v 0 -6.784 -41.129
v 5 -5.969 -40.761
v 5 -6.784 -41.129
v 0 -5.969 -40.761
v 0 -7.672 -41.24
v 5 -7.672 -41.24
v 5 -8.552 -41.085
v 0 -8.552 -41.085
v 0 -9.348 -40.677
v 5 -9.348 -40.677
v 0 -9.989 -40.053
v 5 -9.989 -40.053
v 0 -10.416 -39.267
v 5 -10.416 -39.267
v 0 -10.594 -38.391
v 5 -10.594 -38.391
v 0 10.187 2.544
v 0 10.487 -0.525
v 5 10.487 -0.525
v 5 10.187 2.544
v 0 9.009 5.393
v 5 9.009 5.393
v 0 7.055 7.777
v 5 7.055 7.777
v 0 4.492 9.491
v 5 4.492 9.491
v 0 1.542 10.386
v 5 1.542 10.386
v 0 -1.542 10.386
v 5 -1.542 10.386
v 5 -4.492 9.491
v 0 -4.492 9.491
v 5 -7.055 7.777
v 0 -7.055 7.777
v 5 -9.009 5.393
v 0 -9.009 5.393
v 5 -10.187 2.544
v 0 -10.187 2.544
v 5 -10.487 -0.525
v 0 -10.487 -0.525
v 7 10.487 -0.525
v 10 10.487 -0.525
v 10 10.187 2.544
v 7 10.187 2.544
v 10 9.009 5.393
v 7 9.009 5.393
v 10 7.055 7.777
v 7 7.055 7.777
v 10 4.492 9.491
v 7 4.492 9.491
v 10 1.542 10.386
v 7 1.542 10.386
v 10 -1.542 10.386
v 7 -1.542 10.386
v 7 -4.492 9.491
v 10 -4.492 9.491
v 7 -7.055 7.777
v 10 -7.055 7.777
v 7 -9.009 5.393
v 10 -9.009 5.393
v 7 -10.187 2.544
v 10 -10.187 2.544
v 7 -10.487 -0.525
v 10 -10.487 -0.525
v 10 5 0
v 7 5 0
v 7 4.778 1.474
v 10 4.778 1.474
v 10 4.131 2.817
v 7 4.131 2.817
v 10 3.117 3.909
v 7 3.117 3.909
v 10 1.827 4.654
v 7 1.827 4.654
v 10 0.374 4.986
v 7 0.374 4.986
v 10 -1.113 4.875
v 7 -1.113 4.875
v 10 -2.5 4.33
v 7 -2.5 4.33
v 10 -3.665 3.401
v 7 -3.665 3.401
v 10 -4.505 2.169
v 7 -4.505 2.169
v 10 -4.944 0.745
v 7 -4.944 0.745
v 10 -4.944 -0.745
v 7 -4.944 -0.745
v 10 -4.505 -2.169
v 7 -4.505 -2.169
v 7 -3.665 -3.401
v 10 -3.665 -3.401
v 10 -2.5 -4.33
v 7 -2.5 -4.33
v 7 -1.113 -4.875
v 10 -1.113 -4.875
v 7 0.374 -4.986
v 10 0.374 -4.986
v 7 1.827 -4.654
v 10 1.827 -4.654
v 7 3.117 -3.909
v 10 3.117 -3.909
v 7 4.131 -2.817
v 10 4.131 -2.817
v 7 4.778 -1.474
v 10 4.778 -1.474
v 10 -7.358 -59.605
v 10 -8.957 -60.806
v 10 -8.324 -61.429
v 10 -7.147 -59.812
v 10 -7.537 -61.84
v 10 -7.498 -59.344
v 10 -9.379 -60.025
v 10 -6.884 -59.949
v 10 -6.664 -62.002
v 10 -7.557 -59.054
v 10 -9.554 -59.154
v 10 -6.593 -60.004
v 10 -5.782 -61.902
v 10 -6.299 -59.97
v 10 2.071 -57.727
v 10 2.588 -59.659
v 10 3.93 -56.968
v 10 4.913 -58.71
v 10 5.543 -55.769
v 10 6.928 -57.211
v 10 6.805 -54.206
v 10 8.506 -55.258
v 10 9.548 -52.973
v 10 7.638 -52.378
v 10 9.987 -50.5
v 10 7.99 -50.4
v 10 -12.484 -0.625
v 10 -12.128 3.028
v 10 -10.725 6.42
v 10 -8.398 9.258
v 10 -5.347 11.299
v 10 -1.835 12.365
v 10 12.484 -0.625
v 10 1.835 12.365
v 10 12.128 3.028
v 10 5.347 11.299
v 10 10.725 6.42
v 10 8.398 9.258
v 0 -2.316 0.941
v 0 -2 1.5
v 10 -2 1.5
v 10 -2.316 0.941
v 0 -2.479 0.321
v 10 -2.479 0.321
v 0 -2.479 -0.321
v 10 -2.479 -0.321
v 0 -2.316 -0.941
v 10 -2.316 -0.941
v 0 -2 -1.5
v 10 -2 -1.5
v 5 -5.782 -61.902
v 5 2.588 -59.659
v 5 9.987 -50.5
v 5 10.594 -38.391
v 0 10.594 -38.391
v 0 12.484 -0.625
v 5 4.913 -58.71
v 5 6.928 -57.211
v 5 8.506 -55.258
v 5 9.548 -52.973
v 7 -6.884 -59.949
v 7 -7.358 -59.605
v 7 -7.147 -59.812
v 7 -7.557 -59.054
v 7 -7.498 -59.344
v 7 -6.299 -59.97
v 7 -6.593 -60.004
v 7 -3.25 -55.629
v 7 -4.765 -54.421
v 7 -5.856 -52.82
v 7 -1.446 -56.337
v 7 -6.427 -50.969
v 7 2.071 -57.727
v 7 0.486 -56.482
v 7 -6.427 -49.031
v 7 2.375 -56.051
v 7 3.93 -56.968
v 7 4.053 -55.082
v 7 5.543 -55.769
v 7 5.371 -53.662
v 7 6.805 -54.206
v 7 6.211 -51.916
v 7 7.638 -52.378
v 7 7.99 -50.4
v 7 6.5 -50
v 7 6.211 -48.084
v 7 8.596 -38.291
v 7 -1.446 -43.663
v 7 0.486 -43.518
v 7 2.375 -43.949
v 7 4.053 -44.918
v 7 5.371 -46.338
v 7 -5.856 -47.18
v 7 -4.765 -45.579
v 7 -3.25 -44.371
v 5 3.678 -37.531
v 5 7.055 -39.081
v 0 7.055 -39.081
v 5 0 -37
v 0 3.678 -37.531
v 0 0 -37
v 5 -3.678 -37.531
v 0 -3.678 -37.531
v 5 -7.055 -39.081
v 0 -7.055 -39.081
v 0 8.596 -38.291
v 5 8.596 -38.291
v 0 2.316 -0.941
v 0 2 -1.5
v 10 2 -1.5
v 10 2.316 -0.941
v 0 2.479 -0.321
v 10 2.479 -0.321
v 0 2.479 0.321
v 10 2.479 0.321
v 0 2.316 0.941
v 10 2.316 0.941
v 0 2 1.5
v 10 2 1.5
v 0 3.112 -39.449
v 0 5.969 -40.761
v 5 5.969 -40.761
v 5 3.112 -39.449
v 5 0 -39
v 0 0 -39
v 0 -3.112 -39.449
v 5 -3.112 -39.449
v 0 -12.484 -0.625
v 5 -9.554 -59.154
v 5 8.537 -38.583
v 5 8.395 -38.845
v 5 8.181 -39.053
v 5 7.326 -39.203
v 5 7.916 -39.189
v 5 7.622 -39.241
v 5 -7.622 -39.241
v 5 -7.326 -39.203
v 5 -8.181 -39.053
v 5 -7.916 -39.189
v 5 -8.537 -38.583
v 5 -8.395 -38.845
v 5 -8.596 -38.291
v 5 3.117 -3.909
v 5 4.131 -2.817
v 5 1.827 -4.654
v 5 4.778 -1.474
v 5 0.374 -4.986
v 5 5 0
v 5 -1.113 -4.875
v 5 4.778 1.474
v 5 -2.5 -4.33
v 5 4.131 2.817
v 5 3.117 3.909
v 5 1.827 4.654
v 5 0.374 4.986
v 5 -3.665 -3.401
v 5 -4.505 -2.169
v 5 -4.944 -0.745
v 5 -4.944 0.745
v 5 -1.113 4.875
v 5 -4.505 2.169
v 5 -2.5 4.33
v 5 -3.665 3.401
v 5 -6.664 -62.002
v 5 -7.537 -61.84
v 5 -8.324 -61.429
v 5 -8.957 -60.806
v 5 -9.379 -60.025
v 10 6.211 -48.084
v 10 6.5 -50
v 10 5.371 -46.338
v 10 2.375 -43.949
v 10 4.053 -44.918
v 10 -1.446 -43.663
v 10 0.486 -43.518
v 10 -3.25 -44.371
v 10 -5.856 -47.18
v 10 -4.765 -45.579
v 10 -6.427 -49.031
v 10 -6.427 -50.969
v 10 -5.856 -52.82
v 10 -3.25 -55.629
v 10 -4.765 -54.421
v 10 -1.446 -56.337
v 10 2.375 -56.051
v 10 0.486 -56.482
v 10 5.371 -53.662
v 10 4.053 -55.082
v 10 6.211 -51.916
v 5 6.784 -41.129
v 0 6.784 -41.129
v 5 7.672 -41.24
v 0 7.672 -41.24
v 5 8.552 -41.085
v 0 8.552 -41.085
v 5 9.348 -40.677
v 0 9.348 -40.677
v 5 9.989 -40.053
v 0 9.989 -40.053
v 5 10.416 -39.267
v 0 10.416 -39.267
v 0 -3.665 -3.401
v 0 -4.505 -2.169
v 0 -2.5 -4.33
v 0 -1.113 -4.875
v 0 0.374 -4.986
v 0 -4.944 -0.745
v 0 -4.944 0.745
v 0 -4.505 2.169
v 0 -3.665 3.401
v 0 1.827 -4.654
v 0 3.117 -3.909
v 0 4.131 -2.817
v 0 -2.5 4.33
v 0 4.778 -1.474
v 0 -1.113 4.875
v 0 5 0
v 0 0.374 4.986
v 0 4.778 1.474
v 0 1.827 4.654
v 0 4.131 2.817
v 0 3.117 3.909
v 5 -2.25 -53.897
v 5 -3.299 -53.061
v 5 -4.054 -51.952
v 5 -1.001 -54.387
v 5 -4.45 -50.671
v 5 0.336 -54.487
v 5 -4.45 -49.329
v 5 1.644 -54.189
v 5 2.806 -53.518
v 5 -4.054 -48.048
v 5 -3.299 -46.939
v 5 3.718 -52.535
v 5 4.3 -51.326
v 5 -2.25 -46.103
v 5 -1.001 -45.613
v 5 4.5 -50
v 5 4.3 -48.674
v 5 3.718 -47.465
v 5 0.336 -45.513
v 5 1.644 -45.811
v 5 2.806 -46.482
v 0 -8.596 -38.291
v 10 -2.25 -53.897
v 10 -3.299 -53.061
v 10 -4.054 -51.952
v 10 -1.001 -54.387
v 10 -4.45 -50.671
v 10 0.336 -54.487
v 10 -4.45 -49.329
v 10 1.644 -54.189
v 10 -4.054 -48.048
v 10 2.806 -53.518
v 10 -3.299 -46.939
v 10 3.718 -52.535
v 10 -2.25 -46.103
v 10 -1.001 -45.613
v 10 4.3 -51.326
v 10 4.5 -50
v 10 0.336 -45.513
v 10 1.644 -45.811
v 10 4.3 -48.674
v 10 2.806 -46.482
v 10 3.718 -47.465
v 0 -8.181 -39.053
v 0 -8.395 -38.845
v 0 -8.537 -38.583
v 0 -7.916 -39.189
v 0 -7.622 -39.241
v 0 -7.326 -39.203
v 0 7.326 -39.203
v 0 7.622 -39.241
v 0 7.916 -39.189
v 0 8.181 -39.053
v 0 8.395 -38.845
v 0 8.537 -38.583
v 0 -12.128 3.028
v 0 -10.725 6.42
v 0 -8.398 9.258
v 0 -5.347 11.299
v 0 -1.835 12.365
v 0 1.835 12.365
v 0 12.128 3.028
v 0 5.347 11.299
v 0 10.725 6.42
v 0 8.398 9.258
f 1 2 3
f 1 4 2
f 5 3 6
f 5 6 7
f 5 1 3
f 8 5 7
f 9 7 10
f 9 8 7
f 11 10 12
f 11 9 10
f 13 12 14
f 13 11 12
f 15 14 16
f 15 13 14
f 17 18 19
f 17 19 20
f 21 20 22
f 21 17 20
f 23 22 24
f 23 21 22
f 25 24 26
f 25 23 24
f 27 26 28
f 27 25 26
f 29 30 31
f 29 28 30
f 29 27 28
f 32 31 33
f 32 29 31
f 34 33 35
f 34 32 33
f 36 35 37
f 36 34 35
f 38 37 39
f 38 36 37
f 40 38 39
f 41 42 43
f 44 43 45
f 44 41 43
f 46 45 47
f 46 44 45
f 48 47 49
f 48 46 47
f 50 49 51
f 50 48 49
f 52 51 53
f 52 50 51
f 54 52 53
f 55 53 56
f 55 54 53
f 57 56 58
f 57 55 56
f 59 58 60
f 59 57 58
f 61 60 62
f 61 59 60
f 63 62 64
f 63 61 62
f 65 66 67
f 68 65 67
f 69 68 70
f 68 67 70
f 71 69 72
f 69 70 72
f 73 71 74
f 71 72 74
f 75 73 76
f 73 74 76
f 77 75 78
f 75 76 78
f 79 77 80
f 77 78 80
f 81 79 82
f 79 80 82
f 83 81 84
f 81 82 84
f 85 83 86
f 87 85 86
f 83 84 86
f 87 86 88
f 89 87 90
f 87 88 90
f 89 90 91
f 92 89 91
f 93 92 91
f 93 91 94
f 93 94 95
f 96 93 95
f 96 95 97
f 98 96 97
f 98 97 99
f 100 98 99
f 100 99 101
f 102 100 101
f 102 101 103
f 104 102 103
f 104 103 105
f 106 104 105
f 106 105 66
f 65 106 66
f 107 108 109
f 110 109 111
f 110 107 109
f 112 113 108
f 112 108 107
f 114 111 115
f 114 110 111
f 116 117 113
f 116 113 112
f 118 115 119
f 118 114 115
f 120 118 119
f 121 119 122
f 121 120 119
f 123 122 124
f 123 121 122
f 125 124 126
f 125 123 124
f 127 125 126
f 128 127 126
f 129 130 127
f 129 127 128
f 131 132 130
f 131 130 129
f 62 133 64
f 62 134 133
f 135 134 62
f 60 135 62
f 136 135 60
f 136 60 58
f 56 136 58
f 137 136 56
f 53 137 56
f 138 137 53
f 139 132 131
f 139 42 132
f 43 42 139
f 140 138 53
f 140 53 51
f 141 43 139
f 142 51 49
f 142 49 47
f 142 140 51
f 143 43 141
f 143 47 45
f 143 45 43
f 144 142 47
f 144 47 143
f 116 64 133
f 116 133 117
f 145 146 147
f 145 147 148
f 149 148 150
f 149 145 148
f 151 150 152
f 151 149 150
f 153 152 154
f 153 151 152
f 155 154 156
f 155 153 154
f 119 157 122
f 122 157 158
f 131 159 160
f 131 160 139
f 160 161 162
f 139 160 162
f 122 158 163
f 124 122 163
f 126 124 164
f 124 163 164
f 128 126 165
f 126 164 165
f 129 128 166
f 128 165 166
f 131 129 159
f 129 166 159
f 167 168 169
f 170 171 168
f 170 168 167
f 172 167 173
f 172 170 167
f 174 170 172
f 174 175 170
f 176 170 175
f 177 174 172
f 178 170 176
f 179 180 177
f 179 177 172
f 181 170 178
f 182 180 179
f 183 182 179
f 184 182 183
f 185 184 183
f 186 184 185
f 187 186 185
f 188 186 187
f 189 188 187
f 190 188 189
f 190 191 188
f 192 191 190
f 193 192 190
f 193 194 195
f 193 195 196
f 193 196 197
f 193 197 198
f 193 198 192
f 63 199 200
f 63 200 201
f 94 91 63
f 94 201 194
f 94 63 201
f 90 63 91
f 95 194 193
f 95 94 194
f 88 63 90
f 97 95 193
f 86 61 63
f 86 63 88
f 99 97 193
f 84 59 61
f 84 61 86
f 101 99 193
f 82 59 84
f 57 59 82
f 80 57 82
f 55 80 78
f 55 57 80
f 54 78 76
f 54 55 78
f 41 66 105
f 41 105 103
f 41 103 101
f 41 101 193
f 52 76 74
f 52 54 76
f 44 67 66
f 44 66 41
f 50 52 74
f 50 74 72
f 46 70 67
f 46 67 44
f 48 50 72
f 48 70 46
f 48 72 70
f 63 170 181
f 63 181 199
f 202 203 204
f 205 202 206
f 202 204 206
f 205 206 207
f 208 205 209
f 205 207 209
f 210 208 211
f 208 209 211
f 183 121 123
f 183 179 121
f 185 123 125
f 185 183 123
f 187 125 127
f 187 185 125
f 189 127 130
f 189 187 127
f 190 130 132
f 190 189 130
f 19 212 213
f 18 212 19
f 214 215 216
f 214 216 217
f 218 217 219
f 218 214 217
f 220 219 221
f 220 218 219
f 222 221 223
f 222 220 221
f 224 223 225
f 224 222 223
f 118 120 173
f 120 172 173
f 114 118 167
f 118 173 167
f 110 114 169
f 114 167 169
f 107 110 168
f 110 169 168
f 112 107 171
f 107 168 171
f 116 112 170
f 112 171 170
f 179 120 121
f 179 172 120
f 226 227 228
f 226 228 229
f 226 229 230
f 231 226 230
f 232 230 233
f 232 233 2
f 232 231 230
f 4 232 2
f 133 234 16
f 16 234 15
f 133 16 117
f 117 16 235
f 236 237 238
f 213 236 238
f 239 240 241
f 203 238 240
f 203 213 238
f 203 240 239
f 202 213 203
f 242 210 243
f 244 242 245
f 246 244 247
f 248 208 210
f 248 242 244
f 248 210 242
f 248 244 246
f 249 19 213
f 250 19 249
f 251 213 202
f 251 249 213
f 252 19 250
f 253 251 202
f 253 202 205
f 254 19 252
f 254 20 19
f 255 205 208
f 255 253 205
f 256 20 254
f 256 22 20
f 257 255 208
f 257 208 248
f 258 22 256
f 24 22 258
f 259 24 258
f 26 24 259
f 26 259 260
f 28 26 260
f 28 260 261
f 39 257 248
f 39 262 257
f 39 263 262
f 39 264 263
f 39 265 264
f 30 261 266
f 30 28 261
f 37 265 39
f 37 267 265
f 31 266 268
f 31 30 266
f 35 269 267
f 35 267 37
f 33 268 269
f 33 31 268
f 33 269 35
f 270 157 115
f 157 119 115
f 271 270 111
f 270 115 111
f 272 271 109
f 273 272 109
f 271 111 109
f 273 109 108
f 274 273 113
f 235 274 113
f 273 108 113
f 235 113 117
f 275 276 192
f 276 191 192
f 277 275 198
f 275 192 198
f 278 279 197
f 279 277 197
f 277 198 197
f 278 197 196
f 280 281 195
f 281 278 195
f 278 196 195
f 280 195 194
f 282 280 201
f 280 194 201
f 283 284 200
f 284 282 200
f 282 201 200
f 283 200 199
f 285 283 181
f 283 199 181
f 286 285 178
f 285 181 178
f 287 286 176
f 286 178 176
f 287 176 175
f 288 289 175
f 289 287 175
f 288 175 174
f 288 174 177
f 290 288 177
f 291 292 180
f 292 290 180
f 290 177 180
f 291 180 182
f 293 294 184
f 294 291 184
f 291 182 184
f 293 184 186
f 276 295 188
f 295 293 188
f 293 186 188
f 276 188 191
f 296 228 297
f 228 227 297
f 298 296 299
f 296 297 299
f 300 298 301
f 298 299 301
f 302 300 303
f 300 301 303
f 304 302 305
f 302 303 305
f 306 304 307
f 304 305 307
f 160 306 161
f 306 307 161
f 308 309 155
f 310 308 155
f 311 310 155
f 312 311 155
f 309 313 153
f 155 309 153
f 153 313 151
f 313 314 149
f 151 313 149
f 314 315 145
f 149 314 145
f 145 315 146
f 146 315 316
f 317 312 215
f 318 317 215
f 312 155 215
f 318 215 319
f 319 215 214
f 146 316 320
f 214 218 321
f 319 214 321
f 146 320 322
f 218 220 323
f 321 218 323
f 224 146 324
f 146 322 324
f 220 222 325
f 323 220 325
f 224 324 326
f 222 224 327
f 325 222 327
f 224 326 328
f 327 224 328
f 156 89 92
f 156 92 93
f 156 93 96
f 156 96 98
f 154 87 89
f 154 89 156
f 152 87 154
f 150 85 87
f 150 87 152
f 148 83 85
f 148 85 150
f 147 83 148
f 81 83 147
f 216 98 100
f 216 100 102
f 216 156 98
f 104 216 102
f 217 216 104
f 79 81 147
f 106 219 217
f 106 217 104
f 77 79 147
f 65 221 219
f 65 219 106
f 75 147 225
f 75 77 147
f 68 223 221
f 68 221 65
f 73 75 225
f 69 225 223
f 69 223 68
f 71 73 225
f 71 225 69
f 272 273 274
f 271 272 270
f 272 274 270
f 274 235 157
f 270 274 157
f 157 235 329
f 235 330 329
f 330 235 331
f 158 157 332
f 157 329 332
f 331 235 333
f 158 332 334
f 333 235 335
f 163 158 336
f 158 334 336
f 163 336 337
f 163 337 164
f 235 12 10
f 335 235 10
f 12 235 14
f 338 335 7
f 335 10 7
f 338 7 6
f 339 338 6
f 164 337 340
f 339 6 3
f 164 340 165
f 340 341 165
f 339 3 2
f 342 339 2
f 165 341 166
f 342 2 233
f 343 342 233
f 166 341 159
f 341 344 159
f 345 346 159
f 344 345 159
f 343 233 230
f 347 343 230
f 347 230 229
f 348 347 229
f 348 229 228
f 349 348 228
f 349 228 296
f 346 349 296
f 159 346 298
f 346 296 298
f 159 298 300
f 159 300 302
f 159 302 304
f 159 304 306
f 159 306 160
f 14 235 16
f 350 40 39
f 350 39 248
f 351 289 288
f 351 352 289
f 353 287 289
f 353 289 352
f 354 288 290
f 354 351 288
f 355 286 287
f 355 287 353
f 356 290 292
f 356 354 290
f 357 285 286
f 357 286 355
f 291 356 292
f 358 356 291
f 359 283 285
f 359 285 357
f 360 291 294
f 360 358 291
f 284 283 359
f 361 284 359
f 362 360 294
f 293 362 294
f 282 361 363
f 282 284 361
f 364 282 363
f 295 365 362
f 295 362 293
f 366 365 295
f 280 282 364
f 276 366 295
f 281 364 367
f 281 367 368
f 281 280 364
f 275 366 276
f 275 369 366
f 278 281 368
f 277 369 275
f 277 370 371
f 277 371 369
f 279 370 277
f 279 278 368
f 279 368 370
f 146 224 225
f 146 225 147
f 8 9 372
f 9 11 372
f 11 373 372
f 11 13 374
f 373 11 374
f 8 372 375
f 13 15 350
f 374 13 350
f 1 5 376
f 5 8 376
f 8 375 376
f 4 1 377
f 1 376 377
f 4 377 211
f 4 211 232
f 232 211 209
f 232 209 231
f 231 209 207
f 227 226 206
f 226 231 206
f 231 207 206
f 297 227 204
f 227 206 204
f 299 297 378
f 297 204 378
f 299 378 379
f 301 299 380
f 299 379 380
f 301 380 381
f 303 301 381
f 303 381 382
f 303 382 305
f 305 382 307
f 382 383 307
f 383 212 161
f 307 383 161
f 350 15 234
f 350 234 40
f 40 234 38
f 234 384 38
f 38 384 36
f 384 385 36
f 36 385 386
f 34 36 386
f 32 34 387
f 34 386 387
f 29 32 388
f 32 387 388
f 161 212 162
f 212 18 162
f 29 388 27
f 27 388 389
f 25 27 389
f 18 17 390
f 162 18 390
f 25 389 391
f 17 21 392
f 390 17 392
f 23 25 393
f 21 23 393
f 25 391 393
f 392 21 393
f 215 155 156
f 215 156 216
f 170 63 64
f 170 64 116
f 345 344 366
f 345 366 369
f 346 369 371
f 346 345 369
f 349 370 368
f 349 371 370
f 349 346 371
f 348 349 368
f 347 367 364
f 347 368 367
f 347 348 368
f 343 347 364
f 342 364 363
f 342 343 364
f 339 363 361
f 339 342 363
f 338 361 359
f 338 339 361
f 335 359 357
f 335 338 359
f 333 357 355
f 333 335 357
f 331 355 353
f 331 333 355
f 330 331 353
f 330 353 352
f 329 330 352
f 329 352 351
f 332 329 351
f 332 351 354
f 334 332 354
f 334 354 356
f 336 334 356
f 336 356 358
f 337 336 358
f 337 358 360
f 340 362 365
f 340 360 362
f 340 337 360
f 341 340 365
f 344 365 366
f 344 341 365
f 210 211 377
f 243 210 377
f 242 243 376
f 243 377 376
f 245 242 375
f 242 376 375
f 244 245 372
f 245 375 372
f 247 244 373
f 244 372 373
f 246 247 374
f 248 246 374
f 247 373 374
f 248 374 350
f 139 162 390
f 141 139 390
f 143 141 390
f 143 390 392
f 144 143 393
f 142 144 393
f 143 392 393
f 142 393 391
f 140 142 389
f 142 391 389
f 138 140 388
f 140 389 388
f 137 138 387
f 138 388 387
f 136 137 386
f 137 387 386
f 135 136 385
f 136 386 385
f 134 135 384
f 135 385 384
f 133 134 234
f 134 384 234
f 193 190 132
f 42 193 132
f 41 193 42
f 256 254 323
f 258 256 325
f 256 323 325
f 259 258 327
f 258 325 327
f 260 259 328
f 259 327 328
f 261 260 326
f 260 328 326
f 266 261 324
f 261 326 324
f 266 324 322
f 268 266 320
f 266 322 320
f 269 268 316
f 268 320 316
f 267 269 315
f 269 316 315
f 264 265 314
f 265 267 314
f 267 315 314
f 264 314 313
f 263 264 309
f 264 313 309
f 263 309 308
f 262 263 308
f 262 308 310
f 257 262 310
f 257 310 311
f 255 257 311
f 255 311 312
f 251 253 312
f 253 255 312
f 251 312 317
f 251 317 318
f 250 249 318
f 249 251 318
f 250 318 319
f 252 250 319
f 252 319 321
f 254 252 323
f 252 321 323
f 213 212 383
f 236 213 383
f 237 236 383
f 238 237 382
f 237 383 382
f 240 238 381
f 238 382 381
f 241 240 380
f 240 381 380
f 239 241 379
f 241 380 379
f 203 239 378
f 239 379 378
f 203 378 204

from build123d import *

# Parameters (mm, degrees)
F1_DEPTH  = 10
F3_DEPTH  = 5
F4_R      = 4.5
F5_DEPTH  = 10.001
F6_T      = -2
F7_R      = 1
F8_R      = 3
F10_DEPTH = 2
F11_R     = 5
F12_DEPTH = 10
F14_DEPTH = 10.001


with BuildPart() as f1:
    # F0 (on Right) → F1 (new body)
    with BuildSketch(Plane.YZ):
        with BuildLine():
            Line((9.9874921777, -50.5), (12.4843652221, -0.625))
            ThreePointArc((12.4843652221, -0.625), (0, 12.5), (-12.4843652221, -0.625))
            Line((-12.4843652221, -0.625), (-9.3685649734, -62.863061223))
            Line((-9.3685649734, -62.863061223), (2.588190451, -59.6592582629))
            ThreePointArc((2.588190451, -59.6592582629), (7.7788142654, -56.2841108061), (9.9874921777, -50.5))
        make_face()
    extrude(amount=F1_DEPTH)

    # F2 (on Right) → F3 (cut)
    with BuildSketch(Plane.YZ):
        with BuildLine():
            ThreePointArc((11, -50), (0, -39), (-11, -50))
            Line((-11, -50), (-11, -80))
            Line((-11, -80), (11, -80))
            Line((11, -80), (11, -50))
        make_face()
    extrude(amount=F3_DEPTH, mode=Mode.SUBTRACT)

    # F4 (on Right) → F5 (cut, through all)
    with BuildSketch(Plane.YZ):
        with Locations((0, -50)):
            Circle(F4_R)
    extrude(amount=F5_DEPTH, mode=Mode.SUBTRACT)

    # F6
    f6_openings = [f1.faces().sort_by_distance(p)[0] for p in [
        (0, 0, -14.700163),
        (10, -0.155944, -22.13999),
    ]]
    offset(amount=F6_T, openings=f6_openings, kind=Kind.INTERSECTION)

    # F7
    f7_edges = [f1.edges().sort_by_distance(p)[0] for p in [
        (3.5, 8.502341, -40.165866),
        (3.5, -8.502341, -40.165866),
        (8.5, -7.494852, -60.290449),
    ]]
    fillet(f7_edges, radius=F7_R)

    # F8
    f8_edges = [f1.edges().sort_by_distance(p)[0] for p in [
        (2.5, 10.216621, -45.923156),
        (2.5, -10.216621, -45.923156),
        (7.5, -9.368565, -62.863061),
    ]]
    fillet(f8_edges, radius=F8_R)

    # F9 (on face) → F10 (join)
    with BuildSketch(Plane(origin=(5, 0, 0), x_dir=(0, -1, 0), z_dir=(-1, 0, 0))):
        with BuildLine():
            Line((-10.4868667866, -0.525), (-8.5962115248, -38.2908092756))
            ThreePointArc((-8.5962115248, -38.2908092756), (-8.0535356457, -39.1307514702), (-7.054786428, -39.0807514702))
            ThreePointArc((-7.054786428, -39.0807514702), (0, -37), (7.054786428, -39.0807514702))
            ThreePointArc((7.054786428, -39.0807514702), (8.0535356457, -39.1307514702), (8.5962115248, -38.2908092756))
            Line((8.5962115248, -38.2908092756), (10.4868667866, -0.525))
            ThreePointArc((10.4868667866, -0.525), (0, 10.5), (-10.4868667866, -0.525))
        make_face()
    extrude(amount=-F10_DEPTH)

    # F11 (on Right) → F12 (join)
    with BuildSketch(Plane.YZ):
        Circle(F11_R)
    extrude(amount=F12_DEPTH)

    # F13 (on Right) → F14 (cut, through all)
    with BuildSketch(Plane.YZ):
        with BuildLine():
            Line((-2, -1.5), (2, -1.5))
            ThreePointArc((2, -1.5), (2.5, 0), (2, 1.5))
            Line((2, 1.5), (-2, 1.5))
            ThreePointArc((-2, 1.5), (-2.5, 0), (-2, -1.5))
        make_face()
    extrude(amount=F14_DEPTH, mode=Mode.SUBTRACT)


solid = f1.part
